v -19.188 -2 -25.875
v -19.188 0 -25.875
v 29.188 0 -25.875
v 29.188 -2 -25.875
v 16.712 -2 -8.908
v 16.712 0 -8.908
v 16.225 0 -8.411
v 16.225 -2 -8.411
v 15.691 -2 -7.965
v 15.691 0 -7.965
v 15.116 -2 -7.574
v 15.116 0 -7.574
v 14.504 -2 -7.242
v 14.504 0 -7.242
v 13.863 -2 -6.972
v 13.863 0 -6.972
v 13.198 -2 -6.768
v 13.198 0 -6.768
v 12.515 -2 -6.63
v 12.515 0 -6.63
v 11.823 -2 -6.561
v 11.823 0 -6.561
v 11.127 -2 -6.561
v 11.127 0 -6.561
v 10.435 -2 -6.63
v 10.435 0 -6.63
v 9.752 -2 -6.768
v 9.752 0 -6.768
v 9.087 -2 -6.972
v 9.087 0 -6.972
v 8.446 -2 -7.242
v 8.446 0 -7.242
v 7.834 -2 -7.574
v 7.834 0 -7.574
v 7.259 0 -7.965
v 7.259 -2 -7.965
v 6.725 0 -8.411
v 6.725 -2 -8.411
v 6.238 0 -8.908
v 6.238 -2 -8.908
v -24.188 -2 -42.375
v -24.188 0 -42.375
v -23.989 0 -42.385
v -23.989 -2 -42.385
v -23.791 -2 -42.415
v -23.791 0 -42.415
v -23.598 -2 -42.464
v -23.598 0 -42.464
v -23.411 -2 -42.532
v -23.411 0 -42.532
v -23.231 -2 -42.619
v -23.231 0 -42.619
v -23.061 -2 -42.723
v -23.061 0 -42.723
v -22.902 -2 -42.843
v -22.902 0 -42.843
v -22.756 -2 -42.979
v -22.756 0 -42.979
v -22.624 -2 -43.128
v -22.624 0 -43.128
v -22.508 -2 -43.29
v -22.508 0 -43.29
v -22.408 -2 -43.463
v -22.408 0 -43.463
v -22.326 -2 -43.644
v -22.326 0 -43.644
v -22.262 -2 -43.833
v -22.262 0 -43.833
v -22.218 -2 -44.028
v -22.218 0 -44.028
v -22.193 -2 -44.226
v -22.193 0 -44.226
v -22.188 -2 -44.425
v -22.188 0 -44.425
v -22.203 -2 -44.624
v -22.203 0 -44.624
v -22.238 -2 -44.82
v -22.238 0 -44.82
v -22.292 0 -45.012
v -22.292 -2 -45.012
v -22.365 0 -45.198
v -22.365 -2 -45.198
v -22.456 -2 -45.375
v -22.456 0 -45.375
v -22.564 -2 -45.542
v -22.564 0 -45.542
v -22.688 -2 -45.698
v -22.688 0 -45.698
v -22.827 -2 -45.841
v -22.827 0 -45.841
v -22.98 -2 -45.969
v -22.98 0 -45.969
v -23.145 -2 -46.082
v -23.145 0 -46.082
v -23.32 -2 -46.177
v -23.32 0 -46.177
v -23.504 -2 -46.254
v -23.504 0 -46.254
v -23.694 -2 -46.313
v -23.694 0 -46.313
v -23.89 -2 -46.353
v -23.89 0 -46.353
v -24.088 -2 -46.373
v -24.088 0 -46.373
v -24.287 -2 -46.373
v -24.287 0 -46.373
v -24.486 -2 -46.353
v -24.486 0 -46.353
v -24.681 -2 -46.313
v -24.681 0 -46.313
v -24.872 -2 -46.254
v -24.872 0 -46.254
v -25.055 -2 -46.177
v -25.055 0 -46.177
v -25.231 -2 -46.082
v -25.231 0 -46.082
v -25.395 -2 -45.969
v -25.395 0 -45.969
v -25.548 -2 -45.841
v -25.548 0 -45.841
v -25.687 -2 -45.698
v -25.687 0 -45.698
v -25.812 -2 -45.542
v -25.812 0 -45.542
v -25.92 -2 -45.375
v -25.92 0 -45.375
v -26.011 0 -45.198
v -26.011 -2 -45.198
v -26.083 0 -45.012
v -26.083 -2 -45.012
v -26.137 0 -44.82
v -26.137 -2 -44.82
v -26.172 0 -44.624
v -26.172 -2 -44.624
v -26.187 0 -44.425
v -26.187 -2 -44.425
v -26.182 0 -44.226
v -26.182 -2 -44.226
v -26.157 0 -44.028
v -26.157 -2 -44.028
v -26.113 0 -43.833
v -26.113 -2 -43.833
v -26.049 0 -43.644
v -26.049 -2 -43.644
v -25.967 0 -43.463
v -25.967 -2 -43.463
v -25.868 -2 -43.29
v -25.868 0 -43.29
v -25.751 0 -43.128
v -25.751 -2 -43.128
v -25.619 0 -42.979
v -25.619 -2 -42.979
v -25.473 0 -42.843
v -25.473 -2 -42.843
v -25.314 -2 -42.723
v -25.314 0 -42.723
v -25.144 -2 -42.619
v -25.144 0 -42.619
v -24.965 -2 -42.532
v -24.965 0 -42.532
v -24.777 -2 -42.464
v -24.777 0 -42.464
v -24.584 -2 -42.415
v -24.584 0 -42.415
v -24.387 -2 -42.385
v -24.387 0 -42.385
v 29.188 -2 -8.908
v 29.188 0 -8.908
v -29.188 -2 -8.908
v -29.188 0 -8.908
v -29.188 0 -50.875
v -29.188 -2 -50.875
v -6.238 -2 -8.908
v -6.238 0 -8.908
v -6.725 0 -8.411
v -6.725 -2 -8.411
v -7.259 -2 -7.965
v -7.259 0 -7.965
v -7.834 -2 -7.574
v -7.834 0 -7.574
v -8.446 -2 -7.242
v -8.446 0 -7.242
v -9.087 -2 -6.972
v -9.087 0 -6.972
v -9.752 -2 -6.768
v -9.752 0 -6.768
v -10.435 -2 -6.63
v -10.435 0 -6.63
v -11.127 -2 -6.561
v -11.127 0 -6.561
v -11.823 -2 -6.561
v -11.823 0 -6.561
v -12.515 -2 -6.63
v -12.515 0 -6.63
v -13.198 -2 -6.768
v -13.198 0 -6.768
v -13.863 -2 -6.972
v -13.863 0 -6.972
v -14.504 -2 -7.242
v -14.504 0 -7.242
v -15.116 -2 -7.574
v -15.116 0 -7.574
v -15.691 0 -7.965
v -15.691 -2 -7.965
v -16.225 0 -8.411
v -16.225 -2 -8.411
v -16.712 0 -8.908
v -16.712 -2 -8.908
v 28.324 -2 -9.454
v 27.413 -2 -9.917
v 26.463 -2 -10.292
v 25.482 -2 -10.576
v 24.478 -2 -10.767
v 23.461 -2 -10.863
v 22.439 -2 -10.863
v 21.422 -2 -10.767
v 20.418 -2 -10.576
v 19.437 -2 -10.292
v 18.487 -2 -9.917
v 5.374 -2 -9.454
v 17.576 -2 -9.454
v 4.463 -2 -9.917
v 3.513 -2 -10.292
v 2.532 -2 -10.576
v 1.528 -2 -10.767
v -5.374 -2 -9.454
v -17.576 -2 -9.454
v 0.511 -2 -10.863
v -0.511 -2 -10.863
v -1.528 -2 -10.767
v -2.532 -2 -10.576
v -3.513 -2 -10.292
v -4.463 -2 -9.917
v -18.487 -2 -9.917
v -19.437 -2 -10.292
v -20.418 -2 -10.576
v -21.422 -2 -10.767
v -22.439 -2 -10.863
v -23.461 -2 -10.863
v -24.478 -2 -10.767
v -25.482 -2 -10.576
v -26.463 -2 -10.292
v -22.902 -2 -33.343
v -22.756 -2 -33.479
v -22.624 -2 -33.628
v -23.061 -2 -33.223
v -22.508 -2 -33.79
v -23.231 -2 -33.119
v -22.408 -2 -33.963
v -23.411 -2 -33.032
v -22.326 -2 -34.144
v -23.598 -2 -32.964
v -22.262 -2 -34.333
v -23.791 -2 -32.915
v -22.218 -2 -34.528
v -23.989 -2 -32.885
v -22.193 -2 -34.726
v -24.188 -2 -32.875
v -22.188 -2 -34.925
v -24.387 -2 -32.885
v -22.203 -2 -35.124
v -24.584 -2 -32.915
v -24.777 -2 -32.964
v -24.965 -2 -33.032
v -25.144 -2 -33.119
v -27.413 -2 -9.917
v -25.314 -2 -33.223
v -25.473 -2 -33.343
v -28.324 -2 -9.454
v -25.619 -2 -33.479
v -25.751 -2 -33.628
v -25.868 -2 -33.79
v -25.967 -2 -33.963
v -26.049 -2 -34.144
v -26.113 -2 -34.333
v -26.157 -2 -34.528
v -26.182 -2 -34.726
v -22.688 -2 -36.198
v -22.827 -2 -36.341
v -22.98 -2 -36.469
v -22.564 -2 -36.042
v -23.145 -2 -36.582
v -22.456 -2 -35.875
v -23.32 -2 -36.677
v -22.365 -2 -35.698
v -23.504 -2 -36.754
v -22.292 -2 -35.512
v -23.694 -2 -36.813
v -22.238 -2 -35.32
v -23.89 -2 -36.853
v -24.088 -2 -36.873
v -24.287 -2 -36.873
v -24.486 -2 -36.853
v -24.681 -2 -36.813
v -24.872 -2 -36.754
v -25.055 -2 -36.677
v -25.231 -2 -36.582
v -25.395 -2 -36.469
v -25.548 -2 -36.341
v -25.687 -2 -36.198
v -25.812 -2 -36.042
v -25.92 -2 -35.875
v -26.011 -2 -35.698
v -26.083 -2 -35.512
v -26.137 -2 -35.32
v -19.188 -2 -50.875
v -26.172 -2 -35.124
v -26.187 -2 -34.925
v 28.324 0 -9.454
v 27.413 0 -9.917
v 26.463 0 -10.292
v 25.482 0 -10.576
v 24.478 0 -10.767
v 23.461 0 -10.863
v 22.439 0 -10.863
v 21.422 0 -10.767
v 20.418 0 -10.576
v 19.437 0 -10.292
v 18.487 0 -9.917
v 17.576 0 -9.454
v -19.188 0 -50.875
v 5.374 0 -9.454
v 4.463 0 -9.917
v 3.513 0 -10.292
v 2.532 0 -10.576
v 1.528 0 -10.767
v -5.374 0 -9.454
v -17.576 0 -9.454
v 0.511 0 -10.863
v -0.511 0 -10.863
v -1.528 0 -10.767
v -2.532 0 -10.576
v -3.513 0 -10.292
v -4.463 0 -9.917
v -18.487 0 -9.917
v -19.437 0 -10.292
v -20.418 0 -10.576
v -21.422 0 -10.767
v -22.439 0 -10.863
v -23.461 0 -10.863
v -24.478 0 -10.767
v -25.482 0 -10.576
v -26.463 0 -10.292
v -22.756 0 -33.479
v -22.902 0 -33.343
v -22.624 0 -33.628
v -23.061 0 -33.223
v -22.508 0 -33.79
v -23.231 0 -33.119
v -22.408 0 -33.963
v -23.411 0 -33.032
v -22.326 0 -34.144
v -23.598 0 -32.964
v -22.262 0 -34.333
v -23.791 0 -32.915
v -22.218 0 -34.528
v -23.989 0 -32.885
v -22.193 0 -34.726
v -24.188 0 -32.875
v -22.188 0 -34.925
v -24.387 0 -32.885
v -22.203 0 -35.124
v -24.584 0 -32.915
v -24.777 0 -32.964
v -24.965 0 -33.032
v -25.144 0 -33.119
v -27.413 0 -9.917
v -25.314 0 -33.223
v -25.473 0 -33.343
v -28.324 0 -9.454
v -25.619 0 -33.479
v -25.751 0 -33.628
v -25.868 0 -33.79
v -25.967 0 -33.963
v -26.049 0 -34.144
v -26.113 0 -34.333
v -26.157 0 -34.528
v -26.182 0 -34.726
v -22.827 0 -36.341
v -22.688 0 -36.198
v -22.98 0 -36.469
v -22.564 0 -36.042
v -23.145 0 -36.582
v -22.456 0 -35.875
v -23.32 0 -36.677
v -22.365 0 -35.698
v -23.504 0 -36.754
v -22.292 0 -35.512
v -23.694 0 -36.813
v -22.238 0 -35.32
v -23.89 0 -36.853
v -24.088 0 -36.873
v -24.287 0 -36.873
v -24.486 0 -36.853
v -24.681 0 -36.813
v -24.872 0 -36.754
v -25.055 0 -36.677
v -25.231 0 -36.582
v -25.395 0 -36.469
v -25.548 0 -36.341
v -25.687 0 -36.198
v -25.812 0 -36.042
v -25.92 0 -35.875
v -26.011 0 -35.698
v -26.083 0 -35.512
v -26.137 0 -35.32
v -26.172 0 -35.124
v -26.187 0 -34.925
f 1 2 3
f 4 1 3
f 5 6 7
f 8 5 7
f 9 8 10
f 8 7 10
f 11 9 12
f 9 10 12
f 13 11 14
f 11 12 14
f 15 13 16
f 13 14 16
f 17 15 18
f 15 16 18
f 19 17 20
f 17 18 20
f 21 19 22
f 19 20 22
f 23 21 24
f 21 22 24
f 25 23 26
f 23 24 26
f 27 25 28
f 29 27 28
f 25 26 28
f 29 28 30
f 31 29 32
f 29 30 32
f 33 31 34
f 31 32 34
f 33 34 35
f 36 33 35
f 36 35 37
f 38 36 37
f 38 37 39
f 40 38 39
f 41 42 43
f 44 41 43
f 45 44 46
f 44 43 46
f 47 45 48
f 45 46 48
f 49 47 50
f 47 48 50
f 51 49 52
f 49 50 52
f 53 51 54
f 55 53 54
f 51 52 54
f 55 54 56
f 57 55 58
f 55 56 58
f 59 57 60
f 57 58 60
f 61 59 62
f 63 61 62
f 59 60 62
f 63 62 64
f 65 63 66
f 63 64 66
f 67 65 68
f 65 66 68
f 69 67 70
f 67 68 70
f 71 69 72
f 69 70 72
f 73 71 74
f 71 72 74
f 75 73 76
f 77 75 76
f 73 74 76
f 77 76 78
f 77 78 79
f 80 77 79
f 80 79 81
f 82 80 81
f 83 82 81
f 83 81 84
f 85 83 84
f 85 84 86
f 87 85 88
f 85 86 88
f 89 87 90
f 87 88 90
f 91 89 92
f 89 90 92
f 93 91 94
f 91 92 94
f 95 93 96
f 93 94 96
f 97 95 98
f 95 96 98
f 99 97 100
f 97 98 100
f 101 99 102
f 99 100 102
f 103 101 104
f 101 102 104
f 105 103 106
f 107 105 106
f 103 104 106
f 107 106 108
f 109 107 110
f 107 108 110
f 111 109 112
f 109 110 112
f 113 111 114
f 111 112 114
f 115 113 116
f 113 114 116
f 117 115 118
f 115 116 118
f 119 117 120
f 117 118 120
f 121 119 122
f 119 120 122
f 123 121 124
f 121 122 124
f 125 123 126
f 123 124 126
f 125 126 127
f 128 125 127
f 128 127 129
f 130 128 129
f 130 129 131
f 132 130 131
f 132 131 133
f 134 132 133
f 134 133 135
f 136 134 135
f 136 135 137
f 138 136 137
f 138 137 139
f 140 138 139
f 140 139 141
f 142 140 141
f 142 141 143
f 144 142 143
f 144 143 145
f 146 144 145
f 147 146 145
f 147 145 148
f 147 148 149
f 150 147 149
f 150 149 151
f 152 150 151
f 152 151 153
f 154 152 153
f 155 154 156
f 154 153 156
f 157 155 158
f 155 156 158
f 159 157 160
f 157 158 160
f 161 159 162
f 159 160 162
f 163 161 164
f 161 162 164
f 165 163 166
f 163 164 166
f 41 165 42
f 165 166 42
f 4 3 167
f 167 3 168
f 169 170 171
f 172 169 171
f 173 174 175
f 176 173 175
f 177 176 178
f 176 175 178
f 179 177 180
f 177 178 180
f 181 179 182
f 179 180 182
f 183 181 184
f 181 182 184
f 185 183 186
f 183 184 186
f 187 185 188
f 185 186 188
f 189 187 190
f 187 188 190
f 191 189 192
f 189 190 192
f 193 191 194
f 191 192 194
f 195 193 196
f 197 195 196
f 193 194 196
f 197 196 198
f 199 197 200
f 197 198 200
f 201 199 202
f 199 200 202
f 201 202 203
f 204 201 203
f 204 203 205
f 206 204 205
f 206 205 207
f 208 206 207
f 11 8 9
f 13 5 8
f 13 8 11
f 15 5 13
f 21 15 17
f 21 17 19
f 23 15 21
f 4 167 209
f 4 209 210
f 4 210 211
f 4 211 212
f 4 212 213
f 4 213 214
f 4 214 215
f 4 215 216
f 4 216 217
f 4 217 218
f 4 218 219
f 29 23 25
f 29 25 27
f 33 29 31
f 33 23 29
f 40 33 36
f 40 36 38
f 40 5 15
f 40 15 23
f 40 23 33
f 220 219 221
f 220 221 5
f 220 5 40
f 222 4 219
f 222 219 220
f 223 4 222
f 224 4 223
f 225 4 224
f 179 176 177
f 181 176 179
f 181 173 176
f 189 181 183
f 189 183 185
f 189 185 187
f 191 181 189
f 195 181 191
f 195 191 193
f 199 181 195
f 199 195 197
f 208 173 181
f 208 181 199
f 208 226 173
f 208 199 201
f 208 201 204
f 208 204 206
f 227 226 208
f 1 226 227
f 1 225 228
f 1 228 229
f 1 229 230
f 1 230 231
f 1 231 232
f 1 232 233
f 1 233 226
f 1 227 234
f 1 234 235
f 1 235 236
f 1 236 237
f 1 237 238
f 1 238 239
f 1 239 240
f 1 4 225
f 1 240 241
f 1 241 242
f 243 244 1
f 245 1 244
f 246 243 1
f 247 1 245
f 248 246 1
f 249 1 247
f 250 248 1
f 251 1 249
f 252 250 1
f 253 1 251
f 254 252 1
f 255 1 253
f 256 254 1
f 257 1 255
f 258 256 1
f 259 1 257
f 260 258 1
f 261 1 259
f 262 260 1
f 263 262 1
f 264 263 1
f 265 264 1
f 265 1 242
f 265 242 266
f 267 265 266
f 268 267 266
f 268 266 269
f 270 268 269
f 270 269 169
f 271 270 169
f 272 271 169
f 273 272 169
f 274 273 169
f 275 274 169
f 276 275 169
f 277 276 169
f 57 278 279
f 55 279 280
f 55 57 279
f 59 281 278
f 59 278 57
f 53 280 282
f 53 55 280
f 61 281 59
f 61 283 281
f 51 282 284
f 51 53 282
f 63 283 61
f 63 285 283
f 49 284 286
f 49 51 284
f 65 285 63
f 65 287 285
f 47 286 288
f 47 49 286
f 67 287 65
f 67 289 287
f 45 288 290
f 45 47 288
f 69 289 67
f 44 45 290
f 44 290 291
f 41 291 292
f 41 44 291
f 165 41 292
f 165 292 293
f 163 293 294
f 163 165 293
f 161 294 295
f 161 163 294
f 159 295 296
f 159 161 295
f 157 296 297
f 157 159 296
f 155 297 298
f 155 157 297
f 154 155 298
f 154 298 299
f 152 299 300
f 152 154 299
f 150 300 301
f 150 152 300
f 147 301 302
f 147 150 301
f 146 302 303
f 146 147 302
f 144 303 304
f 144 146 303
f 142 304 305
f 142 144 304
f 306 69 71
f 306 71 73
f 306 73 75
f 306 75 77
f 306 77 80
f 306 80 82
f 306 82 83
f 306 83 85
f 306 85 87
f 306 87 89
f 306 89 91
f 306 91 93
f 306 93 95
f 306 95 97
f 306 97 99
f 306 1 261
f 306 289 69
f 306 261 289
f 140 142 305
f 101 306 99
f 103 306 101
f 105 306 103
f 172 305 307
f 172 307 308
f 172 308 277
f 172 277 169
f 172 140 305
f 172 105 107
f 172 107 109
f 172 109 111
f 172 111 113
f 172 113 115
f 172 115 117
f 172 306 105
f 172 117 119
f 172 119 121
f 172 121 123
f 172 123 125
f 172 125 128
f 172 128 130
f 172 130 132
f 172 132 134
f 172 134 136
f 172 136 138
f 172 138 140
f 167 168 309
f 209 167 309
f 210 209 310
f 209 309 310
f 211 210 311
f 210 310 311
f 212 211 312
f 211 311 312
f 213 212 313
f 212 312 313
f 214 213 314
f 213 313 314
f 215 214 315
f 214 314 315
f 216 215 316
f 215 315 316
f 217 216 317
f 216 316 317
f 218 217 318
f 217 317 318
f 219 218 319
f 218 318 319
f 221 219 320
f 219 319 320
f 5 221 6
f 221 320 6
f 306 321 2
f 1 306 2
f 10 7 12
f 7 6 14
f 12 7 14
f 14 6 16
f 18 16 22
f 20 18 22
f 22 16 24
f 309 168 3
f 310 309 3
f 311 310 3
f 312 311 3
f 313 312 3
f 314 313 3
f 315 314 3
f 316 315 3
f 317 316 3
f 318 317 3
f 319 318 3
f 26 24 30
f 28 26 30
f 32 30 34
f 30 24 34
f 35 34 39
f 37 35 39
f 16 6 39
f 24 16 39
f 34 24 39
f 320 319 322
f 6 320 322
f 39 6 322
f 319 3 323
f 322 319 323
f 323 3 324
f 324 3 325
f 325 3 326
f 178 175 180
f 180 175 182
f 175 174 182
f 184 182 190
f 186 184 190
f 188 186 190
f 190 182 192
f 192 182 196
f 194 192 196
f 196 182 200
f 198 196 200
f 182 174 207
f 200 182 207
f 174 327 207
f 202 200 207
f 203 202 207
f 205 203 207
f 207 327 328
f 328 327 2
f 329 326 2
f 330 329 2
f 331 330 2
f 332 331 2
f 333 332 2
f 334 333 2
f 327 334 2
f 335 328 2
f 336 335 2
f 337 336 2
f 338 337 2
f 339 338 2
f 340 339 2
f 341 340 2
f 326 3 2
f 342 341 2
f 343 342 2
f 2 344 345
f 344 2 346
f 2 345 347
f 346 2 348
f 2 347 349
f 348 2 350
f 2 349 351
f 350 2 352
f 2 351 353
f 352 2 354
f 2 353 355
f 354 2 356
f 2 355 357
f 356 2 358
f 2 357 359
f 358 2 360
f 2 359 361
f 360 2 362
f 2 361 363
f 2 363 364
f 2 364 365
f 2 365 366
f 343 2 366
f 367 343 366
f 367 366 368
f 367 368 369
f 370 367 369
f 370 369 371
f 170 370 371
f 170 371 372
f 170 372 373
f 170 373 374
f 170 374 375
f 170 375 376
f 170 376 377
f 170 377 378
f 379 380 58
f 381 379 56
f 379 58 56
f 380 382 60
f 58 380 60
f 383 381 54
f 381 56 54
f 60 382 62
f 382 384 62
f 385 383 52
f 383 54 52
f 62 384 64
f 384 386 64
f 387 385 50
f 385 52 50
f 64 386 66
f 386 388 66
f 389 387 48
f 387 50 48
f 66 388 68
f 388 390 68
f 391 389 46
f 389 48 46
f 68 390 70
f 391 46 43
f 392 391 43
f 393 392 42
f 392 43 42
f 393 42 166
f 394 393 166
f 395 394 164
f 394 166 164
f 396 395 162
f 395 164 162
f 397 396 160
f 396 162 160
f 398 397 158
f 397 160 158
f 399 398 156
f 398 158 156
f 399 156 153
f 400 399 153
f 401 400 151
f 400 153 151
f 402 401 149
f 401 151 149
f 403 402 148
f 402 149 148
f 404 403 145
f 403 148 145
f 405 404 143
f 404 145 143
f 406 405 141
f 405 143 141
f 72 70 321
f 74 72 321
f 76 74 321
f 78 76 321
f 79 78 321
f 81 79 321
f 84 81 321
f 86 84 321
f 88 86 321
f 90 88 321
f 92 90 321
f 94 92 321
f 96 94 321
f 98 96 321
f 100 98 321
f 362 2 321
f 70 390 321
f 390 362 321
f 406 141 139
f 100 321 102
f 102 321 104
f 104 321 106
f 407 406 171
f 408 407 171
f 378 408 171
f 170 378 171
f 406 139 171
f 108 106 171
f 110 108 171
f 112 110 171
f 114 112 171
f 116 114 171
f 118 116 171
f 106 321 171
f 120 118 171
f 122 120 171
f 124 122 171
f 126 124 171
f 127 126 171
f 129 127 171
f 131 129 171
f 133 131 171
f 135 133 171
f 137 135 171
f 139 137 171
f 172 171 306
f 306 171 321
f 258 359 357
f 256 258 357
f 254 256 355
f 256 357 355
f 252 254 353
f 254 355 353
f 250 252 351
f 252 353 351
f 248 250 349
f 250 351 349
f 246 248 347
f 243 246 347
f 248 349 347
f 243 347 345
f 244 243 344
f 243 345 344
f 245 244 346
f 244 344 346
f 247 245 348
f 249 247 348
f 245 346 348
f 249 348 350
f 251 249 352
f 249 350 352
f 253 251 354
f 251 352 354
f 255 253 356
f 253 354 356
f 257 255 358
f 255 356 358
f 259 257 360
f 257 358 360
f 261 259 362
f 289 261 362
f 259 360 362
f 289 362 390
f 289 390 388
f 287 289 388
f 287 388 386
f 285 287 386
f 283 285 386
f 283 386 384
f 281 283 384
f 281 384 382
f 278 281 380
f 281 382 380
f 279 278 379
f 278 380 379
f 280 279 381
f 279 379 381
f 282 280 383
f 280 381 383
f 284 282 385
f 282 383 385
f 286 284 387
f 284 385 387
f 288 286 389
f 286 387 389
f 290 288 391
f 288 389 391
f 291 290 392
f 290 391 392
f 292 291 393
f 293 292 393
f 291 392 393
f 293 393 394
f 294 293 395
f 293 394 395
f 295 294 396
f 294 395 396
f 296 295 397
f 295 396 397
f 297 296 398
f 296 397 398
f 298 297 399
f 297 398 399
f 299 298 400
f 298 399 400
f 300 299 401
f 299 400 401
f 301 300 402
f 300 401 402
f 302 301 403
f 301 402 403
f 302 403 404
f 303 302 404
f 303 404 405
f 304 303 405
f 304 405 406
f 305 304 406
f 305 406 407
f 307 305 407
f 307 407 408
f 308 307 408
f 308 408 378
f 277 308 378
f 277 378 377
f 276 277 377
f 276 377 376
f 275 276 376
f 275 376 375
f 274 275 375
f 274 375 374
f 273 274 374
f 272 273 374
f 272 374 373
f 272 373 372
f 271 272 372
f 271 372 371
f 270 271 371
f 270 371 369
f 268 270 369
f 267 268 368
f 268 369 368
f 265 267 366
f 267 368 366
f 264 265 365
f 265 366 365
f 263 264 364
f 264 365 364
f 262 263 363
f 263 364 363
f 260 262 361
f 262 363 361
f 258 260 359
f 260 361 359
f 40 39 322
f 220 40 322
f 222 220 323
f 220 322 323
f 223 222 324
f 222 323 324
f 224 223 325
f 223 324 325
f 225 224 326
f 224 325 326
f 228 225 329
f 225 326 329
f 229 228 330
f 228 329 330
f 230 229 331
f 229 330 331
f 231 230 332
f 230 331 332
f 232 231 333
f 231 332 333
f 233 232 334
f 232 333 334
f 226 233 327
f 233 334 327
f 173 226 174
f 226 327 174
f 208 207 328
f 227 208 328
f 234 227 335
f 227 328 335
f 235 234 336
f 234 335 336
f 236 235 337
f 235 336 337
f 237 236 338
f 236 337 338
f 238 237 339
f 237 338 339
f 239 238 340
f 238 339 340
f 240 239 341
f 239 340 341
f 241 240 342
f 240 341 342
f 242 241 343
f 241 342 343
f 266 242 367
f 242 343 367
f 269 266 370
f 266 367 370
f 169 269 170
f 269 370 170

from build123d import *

# Parameters (mm, degrees)
BASE_FLANGE1_DEPTH = 2
SKETCH8_R          = 2
CUT_EXTRUDE1_DEPTH = 2


# Sheet-metal steps are written as plain solids
with BuildPart() as part:
    # Sketch3 → Base-Flange1 (new body)
    with BuildSketch(Plane(origin=(0, 0, 0), x_dir=(1, 0, 0), z_dir=(0, 1, 0))):
        with BuildLine():
            Line((-29.187643745, 8.908278482), (-29.187643745, 25.875))
            Line((-29.187643745, 25.875), (-29.187643745, 50.875))
            Line((-29.187643745, 50.875), (-19.187643745, 50.875))
            Line((-19.187643745, 50.875), (-19.187643745, 25.875))
            Line((-19.187643745, 25.875), (29.187643745, 25.875))
            Line((29.187643745, 25.875), (29.187643745, 8.908278482))
            ThreePointArc((29.187643745, 8.908278482), (22.95, 10.875), (16.712356255, 8.908278482))
            ThreePointArc((16.712356255, 8.908278482), (11.475, 6.552640597), (6.237643745, 8.908278482))
            ThreePointArc((6.237643745, 8.908278482), (0, 10.875), (-6.237643745, 8.908278482))
            ThreePointArc((-6.237643745, 8.908278482), (-11.475, 6.552640597), (-16.712356255, 8.908278482))
            ThreePointArc((-16.712356255, 8.908278482), (-22.95, 10.875), (-29.187643745, 8.908278482))
        make_face()
    extrude(amount=-BASE_FLANGE1_DEPTH)

    # Sketch8 → Cut-Extrude1 (cut)
    with BuildSketch(Plane(origin=(0, 0, 0), x_dir=(1, 0, 0), z_dir=(0, 1, 0))):
        with Locations(Location((-24.187643745, 44.375, 0), (0, 0, 270))):
            Circle(SKETCH8_R)
        with Locations(Location((-24.187643745, 34.875, 0), (0, 0, 270))):
            Circle(SKETCH8_R)
    extrude(amount=-CUT_EXTRUDE1_DEPTH, mode=Mode.SUBTRACT)


solid = part.part
